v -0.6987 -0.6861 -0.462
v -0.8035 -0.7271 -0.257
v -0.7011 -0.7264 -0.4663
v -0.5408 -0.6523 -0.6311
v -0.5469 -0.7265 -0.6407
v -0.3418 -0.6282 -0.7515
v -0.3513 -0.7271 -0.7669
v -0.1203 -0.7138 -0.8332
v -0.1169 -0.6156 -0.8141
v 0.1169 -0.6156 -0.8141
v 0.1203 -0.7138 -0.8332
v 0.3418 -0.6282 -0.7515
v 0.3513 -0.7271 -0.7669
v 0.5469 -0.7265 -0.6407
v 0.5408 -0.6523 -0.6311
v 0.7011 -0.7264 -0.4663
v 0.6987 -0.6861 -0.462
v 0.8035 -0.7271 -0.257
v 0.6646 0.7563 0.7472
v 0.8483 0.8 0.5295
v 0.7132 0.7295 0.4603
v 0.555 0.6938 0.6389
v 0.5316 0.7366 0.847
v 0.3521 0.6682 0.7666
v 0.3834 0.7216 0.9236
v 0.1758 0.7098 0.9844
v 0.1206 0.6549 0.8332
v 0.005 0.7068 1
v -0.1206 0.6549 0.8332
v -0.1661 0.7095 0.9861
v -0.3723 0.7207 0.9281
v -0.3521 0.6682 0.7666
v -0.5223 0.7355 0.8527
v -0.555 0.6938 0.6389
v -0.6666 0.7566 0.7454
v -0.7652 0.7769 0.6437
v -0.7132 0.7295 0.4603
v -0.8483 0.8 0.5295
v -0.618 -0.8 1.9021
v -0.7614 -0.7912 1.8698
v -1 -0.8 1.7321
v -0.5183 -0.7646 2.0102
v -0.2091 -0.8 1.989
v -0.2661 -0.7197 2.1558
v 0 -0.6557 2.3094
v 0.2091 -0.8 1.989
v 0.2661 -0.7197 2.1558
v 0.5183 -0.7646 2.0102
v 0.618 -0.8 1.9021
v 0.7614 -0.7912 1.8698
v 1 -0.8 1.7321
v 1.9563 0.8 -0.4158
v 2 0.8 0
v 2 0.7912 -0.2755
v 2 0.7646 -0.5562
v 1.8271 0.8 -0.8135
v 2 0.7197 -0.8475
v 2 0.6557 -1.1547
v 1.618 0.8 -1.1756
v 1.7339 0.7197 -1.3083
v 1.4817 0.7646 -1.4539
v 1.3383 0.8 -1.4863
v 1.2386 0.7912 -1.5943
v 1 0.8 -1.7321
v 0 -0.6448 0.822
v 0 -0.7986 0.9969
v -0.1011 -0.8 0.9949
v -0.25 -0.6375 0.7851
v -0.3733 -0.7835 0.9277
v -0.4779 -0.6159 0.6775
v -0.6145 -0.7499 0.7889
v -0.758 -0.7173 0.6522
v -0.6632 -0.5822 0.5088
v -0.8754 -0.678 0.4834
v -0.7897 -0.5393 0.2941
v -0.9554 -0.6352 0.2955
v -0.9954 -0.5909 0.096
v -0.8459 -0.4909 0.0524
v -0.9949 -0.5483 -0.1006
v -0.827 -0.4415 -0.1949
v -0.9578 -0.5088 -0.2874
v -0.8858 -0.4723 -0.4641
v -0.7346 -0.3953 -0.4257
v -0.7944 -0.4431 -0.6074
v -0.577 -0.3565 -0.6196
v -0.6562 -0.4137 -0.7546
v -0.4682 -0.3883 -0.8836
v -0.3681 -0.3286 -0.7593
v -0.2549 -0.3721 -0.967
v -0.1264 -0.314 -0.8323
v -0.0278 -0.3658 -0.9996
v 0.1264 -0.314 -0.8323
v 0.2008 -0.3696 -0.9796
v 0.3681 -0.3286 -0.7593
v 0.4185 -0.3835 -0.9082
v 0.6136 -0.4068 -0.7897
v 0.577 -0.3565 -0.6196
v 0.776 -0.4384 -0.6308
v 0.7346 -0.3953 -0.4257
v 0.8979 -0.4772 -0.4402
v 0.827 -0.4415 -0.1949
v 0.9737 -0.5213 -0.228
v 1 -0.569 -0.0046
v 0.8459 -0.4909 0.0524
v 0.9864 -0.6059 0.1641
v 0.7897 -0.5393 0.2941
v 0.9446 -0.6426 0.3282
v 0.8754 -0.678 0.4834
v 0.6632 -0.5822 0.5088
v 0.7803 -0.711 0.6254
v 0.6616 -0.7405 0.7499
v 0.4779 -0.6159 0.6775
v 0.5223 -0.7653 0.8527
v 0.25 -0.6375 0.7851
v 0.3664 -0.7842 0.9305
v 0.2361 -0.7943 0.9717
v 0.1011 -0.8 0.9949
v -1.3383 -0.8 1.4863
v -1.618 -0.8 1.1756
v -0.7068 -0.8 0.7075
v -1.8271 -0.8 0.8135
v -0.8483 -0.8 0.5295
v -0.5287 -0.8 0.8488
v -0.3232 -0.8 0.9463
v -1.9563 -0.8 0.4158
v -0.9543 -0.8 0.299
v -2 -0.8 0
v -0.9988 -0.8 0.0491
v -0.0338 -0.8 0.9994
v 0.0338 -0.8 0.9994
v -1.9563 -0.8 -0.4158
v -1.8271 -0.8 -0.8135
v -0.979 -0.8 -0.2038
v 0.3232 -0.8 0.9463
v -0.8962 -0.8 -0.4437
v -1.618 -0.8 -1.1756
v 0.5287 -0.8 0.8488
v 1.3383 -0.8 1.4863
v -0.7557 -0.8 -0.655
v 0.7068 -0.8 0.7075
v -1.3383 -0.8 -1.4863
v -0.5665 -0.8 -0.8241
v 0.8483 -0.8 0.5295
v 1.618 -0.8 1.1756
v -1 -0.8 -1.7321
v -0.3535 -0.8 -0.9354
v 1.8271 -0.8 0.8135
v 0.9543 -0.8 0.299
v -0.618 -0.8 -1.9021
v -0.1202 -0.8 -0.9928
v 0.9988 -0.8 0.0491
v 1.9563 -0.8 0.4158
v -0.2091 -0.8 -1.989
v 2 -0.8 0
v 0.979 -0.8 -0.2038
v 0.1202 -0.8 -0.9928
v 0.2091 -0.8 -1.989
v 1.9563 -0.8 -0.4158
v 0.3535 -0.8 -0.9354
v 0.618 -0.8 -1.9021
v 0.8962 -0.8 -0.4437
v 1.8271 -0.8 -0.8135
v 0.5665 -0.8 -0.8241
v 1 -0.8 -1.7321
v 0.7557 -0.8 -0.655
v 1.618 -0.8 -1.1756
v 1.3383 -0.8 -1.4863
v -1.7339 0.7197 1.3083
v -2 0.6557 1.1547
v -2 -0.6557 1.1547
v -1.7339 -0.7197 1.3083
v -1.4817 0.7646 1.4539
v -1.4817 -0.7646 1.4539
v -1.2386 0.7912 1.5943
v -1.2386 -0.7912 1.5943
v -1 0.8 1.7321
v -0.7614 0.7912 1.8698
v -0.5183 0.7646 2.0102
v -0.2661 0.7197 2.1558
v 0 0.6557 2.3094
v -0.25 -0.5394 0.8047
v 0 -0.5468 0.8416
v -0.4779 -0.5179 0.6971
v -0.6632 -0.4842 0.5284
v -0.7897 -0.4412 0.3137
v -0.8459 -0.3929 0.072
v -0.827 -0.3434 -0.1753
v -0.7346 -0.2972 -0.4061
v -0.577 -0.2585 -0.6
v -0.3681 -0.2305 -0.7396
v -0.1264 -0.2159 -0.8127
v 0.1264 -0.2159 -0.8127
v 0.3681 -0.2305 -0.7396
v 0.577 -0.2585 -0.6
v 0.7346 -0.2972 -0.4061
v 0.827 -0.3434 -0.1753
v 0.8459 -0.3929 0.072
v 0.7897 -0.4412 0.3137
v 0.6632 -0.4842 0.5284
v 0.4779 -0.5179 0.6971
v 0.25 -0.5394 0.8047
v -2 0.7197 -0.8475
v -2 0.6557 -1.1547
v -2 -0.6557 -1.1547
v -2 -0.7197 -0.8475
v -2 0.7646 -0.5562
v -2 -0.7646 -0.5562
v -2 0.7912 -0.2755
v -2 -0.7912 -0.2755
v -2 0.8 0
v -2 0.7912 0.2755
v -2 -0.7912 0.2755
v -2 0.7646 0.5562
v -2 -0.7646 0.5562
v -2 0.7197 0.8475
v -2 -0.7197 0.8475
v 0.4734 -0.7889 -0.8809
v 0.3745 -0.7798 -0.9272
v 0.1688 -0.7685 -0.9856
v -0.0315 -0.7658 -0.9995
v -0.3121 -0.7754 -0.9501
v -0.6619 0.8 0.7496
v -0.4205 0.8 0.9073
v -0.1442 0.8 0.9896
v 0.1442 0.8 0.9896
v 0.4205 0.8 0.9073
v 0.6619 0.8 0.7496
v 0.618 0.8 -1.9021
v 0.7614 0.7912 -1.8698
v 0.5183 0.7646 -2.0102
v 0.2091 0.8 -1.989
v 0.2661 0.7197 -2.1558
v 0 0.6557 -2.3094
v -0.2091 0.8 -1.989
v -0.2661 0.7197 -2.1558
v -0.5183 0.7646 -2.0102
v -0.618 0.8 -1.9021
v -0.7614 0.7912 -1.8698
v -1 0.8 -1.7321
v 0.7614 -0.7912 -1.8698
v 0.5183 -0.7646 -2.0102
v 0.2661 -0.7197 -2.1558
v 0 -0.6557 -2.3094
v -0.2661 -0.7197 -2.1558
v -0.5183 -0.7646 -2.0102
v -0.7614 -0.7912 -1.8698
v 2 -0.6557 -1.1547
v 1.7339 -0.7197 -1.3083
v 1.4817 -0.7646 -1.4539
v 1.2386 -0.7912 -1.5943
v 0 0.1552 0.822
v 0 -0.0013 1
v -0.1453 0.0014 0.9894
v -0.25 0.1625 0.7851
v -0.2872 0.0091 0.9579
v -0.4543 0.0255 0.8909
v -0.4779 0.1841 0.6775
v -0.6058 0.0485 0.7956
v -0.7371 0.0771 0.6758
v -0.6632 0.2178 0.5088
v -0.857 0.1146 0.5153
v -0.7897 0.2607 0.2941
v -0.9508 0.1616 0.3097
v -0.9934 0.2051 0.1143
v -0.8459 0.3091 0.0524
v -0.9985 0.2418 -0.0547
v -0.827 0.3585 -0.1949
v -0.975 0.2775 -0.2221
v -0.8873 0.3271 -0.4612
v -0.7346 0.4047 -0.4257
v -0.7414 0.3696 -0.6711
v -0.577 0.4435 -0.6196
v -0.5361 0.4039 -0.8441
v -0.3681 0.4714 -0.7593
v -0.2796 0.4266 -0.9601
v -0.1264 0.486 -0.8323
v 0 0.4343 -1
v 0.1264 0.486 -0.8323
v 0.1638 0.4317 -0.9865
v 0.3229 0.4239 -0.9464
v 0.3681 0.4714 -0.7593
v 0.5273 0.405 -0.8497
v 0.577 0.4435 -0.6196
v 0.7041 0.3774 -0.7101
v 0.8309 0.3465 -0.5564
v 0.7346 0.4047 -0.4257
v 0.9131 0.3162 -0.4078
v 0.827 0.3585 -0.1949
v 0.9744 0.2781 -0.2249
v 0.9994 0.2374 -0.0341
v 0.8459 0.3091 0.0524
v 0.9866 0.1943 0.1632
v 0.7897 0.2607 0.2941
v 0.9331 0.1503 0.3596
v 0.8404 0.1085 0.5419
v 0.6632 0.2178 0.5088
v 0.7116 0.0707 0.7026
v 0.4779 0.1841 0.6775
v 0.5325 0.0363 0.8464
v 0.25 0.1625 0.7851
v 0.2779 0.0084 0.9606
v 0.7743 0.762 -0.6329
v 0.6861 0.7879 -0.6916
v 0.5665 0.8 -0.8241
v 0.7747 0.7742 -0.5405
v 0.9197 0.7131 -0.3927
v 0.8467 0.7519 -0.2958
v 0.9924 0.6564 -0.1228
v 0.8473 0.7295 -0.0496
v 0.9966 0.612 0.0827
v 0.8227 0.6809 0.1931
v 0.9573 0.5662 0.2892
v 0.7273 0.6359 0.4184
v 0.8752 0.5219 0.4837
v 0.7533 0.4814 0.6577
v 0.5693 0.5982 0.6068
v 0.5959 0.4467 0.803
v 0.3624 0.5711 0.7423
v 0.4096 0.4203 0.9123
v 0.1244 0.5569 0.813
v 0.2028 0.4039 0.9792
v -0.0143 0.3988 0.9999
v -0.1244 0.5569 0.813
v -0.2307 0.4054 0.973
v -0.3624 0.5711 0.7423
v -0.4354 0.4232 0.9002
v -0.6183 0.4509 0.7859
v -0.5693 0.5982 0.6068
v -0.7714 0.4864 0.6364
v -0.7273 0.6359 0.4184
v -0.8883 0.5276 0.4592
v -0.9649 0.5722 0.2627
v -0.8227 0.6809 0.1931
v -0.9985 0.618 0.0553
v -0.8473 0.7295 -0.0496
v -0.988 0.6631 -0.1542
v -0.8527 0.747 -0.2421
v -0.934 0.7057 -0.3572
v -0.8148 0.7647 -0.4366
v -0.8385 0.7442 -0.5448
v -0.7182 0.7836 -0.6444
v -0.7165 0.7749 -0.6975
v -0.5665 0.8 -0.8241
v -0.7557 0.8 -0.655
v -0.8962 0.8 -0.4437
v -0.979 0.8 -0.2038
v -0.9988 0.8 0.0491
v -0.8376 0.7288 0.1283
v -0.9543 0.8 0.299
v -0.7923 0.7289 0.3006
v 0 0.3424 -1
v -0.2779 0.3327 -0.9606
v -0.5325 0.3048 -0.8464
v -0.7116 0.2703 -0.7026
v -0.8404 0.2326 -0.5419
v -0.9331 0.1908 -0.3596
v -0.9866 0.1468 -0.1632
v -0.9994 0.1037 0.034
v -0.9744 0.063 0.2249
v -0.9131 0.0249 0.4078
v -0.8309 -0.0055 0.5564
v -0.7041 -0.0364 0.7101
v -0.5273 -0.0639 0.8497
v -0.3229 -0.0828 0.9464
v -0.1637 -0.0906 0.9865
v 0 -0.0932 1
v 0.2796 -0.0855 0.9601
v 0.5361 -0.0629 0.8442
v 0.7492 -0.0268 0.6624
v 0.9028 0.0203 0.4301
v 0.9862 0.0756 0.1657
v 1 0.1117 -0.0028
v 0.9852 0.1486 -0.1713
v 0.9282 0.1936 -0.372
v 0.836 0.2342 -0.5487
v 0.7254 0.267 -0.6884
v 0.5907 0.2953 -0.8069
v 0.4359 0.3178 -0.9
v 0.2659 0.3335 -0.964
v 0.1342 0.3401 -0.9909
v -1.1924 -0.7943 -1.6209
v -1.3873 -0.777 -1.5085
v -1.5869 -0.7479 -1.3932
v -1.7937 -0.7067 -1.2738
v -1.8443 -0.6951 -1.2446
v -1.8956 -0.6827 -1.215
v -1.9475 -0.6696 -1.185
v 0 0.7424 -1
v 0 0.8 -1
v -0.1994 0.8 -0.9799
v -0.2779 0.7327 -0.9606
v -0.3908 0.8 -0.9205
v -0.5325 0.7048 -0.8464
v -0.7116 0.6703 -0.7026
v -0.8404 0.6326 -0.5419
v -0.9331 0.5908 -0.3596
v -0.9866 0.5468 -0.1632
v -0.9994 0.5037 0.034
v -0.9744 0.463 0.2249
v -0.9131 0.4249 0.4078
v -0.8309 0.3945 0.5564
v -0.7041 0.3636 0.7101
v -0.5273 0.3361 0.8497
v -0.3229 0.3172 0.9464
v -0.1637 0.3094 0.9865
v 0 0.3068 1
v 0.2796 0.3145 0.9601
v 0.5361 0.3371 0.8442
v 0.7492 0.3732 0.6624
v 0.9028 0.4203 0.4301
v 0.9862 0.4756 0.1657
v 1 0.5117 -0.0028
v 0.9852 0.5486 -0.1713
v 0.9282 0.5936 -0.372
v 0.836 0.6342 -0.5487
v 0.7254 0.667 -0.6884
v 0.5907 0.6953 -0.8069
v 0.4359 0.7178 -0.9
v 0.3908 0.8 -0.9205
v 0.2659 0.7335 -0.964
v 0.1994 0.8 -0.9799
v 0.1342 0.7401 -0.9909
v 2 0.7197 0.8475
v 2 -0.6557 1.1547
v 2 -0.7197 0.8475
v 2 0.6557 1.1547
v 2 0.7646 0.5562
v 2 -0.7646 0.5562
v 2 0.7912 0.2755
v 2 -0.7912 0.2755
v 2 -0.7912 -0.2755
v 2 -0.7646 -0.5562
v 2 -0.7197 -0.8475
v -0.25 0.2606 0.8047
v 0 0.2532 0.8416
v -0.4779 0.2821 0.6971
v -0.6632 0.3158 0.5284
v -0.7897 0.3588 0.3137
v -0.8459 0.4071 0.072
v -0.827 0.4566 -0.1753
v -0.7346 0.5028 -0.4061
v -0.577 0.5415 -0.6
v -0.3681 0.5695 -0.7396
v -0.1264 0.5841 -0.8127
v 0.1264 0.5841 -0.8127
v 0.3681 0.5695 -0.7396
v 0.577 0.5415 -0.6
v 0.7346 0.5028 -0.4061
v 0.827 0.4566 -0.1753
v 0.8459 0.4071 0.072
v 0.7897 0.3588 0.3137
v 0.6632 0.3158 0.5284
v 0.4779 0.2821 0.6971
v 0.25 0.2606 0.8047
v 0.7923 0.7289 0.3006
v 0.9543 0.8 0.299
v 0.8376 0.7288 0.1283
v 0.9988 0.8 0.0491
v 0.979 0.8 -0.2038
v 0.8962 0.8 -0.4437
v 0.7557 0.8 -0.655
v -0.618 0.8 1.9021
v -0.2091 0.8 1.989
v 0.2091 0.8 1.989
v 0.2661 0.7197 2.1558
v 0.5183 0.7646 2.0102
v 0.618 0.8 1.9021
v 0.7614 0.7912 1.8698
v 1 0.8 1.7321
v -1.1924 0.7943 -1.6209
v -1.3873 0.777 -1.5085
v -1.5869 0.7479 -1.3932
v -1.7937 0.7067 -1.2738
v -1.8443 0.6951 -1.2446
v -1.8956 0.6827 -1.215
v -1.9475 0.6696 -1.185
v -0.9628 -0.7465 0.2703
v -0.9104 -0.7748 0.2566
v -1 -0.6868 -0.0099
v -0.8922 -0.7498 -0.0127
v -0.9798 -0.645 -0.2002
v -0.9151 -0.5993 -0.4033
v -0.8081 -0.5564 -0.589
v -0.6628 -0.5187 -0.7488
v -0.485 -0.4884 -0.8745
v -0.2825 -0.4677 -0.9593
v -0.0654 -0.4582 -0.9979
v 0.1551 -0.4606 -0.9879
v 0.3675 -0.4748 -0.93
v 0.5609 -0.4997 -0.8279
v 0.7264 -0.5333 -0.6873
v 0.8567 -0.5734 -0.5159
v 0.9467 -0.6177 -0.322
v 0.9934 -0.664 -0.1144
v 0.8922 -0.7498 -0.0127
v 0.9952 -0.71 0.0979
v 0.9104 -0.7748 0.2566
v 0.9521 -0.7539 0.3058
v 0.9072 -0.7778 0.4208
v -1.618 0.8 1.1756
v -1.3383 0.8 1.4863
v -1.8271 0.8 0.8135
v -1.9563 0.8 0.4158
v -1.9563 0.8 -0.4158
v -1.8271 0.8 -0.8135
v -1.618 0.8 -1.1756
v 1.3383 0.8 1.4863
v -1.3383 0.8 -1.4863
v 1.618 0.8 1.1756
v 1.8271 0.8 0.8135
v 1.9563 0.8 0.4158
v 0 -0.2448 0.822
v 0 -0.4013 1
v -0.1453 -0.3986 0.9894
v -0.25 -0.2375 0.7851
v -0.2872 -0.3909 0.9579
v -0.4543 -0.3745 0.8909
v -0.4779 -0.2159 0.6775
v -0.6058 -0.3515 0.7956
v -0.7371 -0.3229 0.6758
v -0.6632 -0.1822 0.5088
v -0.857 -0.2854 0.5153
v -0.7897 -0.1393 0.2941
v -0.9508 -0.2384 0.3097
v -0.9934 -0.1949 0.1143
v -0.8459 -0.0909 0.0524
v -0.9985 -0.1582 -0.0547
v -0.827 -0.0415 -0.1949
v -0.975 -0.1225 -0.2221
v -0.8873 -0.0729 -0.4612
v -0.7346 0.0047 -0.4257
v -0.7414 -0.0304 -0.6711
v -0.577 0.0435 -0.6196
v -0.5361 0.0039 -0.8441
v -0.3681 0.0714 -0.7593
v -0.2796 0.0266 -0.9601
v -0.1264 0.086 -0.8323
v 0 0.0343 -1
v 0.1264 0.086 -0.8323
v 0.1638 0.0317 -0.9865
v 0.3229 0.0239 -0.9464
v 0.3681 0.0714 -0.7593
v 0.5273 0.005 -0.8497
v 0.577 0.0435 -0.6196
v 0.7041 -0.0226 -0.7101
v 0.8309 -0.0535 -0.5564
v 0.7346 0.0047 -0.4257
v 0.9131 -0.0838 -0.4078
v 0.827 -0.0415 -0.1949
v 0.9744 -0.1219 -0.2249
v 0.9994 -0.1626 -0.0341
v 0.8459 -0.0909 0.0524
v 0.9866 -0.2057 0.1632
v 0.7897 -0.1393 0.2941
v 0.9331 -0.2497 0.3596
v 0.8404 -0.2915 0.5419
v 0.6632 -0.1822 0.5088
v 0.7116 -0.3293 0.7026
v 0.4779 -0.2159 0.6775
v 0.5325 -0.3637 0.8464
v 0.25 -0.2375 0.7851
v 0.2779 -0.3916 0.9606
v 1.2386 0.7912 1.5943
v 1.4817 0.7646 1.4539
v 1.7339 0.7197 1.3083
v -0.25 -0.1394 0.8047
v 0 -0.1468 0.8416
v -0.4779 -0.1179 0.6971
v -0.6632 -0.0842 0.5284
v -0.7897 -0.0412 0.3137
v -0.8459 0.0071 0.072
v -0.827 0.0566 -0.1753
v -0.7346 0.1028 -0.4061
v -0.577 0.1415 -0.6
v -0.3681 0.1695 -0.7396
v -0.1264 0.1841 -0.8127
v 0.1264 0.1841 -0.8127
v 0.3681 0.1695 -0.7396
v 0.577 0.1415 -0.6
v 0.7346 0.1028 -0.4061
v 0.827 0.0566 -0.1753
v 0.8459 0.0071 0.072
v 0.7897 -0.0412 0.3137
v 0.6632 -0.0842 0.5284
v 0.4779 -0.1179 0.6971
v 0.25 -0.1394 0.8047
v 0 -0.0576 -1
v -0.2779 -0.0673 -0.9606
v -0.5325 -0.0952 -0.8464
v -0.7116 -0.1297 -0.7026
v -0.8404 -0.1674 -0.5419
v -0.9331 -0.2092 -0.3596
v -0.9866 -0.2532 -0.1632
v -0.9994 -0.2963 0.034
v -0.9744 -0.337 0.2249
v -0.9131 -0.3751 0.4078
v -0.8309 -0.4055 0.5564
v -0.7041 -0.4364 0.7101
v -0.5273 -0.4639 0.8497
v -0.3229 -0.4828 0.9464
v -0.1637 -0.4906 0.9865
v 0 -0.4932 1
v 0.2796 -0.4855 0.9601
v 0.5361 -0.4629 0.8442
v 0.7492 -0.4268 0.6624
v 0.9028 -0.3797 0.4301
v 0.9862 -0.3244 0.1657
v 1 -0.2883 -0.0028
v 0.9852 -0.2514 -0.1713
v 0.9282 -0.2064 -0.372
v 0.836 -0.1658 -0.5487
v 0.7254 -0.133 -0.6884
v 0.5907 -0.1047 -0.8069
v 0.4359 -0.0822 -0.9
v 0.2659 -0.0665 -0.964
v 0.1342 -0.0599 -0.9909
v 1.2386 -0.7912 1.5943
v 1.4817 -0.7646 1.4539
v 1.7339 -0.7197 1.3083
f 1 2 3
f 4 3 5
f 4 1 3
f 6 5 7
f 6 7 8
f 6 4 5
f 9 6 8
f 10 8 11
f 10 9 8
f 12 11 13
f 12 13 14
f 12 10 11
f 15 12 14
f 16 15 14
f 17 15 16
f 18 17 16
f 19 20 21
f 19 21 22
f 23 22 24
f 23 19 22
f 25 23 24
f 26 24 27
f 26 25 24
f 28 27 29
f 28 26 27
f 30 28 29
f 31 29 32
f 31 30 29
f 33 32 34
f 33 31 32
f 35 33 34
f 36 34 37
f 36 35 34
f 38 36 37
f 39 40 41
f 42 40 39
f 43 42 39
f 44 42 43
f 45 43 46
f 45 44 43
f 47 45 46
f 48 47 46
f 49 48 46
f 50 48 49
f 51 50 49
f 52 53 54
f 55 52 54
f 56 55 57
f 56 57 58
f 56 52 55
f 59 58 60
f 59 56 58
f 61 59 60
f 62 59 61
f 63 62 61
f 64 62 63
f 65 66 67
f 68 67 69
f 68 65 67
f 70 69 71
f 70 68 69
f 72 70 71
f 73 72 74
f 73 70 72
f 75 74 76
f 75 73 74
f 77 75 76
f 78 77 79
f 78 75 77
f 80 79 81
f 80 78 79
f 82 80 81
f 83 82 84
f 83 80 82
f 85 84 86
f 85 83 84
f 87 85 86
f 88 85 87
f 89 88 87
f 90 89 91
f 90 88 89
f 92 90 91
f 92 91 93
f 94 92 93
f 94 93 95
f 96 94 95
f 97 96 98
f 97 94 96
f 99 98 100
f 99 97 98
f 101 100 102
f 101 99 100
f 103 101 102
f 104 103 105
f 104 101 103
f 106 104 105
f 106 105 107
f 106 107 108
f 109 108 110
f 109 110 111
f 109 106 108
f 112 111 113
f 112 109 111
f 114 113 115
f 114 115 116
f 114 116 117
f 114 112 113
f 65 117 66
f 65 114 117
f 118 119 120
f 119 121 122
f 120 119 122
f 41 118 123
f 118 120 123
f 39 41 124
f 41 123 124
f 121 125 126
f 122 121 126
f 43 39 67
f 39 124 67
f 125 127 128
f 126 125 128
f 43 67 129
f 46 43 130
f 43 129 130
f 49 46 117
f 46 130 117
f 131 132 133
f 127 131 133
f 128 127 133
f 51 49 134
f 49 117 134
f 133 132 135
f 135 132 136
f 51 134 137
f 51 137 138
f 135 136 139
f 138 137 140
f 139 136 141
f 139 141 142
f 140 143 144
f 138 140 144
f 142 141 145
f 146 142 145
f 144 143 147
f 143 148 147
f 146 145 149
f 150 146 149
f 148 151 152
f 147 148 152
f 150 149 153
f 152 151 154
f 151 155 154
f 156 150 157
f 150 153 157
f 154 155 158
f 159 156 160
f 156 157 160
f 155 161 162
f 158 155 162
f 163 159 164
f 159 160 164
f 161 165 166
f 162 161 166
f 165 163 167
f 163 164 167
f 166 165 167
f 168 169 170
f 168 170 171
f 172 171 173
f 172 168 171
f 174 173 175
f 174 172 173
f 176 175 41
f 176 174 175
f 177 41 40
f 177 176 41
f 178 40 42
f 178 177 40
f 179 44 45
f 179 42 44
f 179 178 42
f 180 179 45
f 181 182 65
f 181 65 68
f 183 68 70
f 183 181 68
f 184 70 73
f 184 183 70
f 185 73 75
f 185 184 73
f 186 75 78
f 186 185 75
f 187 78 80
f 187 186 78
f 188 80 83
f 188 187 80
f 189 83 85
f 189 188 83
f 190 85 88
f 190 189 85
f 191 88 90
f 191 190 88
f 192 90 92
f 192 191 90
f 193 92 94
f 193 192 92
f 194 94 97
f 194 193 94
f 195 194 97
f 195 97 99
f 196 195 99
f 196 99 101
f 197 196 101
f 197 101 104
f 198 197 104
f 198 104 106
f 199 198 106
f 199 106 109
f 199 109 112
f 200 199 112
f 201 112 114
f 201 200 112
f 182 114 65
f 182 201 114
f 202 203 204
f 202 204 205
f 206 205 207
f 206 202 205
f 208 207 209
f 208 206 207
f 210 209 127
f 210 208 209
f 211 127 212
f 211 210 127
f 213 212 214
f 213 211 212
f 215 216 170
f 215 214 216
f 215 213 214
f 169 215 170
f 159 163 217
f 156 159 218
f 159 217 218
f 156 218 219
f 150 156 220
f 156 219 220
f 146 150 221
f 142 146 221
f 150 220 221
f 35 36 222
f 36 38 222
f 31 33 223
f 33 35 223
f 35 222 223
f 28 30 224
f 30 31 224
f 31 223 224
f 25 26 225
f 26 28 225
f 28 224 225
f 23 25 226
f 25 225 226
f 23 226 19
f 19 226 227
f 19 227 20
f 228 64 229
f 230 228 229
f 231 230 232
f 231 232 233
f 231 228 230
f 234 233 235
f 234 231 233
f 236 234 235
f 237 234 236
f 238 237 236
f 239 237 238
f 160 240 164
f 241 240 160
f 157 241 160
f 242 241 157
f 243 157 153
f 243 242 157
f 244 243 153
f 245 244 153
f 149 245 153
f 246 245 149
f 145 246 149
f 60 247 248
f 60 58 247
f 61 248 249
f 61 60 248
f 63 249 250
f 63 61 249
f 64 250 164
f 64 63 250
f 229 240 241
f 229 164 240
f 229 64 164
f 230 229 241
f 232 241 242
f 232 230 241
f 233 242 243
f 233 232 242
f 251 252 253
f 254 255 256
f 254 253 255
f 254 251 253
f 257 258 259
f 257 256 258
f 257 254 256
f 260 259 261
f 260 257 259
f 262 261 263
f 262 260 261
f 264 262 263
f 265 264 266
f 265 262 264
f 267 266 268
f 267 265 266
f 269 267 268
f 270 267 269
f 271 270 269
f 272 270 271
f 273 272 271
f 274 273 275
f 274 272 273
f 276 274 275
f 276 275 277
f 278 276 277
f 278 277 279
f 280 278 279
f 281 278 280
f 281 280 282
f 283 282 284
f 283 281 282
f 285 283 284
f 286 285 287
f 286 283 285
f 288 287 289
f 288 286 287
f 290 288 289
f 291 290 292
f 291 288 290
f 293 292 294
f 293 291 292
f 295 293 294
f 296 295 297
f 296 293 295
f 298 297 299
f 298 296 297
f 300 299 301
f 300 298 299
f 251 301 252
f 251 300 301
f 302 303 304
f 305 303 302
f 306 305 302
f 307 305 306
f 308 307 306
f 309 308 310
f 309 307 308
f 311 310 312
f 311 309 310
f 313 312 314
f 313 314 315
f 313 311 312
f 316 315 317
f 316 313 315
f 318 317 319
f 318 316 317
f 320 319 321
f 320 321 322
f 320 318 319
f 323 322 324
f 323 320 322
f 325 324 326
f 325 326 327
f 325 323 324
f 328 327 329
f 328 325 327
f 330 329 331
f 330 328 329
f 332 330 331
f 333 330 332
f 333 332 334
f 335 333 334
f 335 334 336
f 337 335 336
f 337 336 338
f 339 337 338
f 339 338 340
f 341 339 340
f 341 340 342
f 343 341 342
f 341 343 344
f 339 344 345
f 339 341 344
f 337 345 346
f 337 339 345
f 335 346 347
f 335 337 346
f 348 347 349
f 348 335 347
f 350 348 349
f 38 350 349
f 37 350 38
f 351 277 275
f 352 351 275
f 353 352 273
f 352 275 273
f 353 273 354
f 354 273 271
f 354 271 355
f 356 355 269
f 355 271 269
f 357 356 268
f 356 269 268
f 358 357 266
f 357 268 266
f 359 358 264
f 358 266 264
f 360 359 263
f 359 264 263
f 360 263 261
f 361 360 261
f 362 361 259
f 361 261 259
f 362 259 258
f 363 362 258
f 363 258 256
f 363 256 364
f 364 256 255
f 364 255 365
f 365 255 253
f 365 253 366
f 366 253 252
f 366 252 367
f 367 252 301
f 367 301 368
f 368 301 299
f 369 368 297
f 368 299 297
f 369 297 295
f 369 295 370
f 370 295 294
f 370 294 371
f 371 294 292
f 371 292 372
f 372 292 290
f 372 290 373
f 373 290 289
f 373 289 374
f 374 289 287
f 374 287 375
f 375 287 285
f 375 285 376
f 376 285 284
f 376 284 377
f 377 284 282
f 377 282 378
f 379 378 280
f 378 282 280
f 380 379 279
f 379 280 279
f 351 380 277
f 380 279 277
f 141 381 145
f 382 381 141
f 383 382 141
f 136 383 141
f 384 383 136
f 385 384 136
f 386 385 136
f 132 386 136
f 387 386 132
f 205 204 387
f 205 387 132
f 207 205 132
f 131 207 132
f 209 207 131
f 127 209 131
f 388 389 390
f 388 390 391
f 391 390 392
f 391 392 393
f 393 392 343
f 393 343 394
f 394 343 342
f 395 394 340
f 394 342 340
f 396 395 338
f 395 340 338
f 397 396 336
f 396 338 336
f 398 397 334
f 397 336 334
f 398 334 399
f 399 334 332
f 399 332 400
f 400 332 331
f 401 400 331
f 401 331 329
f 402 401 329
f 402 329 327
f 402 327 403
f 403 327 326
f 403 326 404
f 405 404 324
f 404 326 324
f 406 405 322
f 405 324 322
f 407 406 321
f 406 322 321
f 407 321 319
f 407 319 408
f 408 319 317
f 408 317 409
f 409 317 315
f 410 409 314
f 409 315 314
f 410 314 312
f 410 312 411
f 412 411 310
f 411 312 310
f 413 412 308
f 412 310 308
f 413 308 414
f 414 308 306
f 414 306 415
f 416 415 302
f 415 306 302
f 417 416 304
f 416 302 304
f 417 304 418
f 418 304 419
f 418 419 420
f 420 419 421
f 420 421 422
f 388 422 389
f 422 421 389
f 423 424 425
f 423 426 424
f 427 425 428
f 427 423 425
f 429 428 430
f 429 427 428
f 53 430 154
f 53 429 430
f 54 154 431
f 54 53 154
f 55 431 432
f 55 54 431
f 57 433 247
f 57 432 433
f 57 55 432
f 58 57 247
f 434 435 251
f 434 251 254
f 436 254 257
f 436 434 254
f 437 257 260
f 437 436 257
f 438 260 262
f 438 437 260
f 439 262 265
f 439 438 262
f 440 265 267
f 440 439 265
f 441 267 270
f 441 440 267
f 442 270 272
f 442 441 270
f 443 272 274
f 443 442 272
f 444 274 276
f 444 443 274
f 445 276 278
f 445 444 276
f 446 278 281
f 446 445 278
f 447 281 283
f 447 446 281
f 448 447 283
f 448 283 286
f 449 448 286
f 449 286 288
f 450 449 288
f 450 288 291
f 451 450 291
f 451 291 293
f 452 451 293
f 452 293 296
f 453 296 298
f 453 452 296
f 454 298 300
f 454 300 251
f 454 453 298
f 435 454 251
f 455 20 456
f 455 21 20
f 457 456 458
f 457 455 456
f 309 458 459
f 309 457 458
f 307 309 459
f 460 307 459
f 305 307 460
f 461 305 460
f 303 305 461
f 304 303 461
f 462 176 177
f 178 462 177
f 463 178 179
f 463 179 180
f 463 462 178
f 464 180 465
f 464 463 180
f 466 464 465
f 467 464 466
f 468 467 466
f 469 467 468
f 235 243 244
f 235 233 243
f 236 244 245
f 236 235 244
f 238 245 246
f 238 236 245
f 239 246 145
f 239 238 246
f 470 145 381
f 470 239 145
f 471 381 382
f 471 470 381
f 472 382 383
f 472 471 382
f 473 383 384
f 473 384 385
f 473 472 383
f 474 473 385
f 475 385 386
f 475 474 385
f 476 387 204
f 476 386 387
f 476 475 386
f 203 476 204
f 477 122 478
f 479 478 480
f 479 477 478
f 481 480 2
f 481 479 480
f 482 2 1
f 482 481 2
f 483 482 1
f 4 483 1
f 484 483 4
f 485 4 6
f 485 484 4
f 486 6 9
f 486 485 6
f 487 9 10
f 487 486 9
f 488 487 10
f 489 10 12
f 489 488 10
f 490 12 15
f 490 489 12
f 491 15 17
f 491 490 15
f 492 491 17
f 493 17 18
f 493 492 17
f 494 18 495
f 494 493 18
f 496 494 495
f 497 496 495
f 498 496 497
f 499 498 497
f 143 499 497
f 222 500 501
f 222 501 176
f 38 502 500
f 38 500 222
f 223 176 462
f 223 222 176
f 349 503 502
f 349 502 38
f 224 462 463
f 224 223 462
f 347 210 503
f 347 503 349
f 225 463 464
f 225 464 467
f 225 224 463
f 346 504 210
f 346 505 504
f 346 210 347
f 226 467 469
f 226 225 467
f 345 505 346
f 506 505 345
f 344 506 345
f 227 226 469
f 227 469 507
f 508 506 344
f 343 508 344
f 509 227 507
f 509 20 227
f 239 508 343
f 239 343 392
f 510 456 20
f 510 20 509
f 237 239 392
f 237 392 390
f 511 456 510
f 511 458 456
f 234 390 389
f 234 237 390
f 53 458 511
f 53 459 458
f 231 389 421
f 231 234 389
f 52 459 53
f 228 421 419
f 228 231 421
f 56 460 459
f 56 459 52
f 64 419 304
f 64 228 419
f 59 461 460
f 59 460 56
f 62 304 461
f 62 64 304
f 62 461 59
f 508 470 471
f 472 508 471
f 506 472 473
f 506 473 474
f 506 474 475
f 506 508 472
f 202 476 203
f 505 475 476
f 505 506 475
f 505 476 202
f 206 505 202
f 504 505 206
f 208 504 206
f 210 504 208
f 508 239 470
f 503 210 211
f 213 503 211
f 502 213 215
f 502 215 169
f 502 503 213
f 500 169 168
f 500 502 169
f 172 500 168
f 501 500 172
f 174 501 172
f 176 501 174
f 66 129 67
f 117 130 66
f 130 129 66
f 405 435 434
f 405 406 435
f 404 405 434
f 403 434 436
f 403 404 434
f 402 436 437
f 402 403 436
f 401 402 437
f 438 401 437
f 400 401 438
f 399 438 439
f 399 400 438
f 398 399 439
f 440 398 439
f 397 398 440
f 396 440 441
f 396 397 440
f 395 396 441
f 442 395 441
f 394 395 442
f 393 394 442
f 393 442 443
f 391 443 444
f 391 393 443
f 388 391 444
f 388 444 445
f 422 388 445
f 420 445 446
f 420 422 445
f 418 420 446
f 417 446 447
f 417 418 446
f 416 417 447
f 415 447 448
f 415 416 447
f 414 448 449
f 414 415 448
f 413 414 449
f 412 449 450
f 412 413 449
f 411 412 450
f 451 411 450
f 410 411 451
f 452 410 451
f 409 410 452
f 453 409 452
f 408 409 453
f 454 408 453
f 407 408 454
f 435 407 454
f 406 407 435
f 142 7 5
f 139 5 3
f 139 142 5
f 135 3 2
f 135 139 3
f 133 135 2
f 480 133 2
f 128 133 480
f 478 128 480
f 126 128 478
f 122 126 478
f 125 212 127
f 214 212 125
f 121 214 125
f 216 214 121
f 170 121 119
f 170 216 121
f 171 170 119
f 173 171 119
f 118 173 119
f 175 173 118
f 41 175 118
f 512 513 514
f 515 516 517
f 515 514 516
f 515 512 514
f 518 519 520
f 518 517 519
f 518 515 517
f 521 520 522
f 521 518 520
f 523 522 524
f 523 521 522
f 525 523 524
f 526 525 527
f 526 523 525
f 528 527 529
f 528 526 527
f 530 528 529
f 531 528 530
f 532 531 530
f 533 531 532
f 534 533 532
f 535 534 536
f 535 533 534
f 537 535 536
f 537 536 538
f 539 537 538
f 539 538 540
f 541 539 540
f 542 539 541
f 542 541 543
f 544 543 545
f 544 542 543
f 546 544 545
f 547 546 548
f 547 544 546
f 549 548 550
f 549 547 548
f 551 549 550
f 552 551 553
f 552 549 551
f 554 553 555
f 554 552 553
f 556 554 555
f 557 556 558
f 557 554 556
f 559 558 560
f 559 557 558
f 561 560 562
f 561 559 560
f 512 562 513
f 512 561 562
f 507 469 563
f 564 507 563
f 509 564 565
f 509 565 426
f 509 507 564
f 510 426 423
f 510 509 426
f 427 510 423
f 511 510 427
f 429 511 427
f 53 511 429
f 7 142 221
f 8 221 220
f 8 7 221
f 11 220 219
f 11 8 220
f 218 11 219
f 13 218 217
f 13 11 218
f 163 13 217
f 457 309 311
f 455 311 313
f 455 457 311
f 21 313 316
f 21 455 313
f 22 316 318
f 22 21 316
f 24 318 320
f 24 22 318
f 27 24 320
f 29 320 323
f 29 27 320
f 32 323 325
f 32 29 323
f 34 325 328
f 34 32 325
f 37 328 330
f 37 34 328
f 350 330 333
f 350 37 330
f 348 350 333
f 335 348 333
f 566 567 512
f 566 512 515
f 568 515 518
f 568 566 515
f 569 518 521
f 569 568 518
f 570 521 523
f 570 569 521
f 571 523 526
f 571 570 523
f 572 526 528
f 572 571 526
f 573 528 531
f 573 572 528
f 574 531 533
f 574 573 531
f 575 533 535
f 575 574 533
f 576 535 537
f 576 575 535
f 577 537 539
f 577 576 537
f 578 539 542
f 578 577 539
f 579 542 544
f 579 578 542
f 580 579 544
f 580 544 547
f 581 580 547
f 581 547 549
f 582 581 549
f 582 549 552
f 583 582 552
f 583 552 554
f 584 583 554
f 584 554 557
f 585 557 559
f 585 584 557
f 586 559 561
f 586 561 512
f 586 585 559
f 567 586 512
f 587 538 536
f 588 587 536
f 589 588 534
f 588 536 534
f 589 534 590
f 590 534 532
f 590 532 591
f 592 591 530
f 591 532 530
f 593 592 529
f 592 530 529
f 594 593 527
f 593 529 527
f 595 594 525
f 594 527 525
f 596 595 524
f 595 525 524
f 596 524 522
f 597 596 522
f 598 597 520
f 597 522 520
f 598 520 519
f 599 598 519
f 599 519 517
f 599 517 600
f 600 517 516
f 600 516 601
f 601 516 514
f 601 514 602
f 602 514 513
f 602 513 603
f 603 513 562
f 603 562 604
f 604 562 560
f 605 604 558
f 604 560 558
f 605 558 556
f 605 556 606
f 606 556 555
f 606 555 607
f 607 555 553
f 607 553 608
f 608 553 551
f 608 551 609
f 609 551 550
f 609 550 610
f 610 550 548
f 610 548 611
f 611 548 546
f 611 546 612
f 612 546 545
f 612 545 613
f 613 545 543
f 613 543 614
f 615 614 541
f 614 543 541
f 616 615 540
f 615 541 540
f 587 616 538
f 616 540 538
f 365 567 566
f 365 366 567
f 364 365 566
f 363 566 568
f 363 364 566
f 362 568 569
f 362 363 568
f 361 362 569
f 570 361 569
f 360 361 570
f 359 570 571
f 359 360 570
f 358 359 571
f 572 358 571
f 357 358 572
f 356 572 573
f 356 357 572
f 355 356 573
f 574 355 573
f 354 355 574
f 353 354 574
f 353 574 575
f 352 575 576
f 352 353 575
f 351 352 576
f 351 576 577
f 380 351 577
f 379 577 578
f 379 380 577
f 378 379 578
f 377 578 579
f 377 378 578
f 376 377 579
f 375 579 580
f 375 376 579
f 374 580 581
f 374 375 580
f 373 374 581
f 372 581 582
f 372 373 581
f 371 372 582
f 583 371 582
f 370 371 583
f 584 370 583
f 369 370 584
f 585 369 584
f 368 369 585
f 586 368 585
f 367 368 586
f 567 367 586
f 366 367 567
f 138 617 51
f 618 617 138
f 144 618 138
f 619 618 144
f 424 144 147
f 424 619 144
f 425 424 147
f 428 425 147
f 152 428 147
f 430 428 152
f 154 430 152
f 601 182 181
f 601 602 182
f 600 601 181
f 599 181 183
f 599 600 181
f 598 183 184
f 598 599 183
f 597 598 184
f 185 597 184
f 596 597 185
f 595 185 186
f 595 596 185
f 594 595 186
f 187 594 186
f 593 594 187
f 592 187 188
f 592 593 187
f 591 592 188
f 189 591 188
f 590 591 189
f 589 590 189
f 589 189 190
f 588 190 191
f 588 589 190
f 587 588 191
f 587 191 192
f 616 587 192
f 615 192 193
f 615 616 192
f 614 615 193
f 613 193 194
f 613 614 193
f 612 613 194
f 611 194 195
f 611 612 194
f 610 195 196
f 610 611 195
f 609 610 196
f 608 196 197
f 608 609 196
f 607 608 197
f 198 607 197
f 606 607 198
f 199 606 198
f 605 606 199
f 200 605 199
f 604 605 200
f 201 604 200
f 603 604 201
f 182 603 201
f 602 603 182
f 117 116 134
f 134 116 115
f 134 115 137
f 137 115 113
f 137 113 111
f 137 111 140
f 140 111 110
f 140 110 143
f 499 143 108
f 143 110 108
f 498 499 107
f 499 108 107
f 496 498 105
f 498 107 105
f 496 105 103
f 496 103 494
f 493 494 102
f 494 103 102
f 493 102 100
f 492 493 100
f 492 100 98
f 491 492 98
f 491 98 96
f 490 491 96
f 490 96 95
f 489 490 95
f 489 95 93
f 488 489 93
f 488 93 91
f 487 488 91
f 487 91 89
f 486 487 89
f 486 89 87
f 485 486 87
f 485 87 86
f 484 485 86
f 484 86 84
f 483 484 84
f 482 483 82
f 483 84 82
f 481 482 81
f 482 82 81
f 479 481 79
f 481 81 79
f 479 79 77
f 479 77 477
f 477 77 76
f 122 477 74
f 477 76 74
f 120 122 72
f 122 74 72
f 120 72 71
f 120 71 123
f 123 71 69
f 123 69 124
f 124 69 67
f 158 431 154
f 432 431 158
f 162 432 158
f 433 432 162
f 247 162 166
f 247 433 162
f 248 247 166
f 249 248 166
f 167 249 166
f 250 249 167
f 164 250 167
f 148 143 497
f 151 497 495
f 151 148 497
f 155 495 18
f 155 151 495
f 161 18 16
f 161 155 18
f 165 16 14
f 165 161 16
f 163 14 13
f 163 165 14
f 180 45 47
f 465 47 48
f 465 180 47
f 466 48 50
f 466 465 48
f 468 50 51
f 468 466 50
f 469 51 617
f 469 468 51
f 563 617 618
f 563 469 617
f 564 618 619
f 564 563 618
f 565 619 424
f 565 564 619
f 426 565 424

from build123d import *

# Parameters (mm, degrees)
EXTRUDE1_DEPTH      = 0.8
SKETCH2_W           = 1
SKETCH2_H           = 1.6
LPATTERN1_COUNT     = 4
LPATTERN1_PITCH     = 0.4
LPATTERN1_COL_COUNT = 2
LPATTERN1_COL_PITCH = 0.4


with BuildPart() as part:
    # Sketch1 → Extrude1 (new, symmetric)
    with BuildSketch(Plane(origin=(0, 0, 0), x_dir=(1, 0, 0), z_dir=(0, 1, 0))):
        Polygon((0, 2.309401077), (-2, 1.154700538), (-2, -1.154700538), (0, -2.309401077), (2, -1.154700538), (2, 1.154700538), align=None)
    extrude(amount=EXTRUDE1_DEPTH, both=True)

    # Sketch4 → Cut-Revolve2 (revolve, cut)
    with BuildSketch(Plane(origin=(0, 0, 0), x_dir=(0, 0, -1), z_dir=(1, 0, 0))):
        Polygon((0, 0.8), (1, 0.8), (0.82201838, 0.717005807), (0.82201838, -0.717005807), (1, -0.8), (0, -0.8), align=None)
    revolve(axis=Axis((0, 0.8, 0), (0, 1, 0)), mode=Mode.SUBTRACT)


with BuildPart() as body_2:
    # Sketch2 → Revolve1 (revolve)
    with BuildSketch(Plane(origin=(0, 0, 0), x_dir=(0, 0, -1), z_dir=(1, 0, 0))):
        with Locations((0.5, 0)):
            Rectangle(SKETCH2_W, SKETCH2_H)
    revolve(axis=Axis((0, -1.8, 0), (0, 1, 0)))

    # Sketch3 → Cut-Revolve1 (revolve, cut)
    with BuildSketch(Plane(origin=(0, 0, 0), x_dir=(0, 0, -1), z_dir=(1, 0, 0)), mode=Mode.PRIVATE) as cut_revolve1_sk:
        Polygon((1.009805807, 0.750970966), (1.078446454, 0.40776773), (0.841629993, 0.487879925), (0.82201838, 0.585937993), align=None)
    cut_revolve1 = revolve(cut_revolve1_sk.sketch.rotate(Axis((0, 0.8, 0.085891176), (0, -0.9805806756909201, -0.19611613513818438)), 180), axis=Axis((0, 0.8, 0.085891176), (0, -0.9805806756909201, -0.19611613513818438)), mode=Mode.SUBTRACT)

    # LPattern1: Cut-Revolve1 ×4
    with Locations(*[(0, -i * LPATTERN1_PITCH, 0) for i in range(1, LPATTERN1_COUNT)]):
        add(cut_revolve1, mode=Mode.SUBTRACT)

    # LPattern1 col: Cut-Revolve1 ×2
    with Locations(*[(0, i * LPATTERN1_COL_PITCH, 0) for i in range(1, LPATTERN1_COL_COUNT)]):
        add(cut_revolve1, mode=Mode.SUBTRACT)


with BuildPart() as part_1:
    add(part.part)

    # Combine1: cut body 2
    add(body_2.part, mode=Mode.SUBTRACT)

    # Sketch5 → Cut-Revolve3 (revolve, cut)
    with BuildSketch(Plane(origin=(0, 0, 0), x_dir=(0, 0, -1), z_dir=(1, 0, 0)), mode=Mode.PRIVATE) as cut_revolve3_sk:
        Polygon((0, -0.8), (2, -0.8), (2.309401077, -0.655723908), (2.309401077, 0.655723908), (2, 0.8), (0, 0.8), (0, 2.07), (3.579401077, 2.07), (3.579401077, -2.07), (0, -2.07), align=None)
    revolve(cut_revolve3_sk.sketch.rotate(Axis((0, -0.8, 0), (0, 1, 0)), 54.619043446), axis=Axis((0, -0.8, 0), (0, 1, 0)), mode=Mode.SUBTRACT)


solid = part_1.part
